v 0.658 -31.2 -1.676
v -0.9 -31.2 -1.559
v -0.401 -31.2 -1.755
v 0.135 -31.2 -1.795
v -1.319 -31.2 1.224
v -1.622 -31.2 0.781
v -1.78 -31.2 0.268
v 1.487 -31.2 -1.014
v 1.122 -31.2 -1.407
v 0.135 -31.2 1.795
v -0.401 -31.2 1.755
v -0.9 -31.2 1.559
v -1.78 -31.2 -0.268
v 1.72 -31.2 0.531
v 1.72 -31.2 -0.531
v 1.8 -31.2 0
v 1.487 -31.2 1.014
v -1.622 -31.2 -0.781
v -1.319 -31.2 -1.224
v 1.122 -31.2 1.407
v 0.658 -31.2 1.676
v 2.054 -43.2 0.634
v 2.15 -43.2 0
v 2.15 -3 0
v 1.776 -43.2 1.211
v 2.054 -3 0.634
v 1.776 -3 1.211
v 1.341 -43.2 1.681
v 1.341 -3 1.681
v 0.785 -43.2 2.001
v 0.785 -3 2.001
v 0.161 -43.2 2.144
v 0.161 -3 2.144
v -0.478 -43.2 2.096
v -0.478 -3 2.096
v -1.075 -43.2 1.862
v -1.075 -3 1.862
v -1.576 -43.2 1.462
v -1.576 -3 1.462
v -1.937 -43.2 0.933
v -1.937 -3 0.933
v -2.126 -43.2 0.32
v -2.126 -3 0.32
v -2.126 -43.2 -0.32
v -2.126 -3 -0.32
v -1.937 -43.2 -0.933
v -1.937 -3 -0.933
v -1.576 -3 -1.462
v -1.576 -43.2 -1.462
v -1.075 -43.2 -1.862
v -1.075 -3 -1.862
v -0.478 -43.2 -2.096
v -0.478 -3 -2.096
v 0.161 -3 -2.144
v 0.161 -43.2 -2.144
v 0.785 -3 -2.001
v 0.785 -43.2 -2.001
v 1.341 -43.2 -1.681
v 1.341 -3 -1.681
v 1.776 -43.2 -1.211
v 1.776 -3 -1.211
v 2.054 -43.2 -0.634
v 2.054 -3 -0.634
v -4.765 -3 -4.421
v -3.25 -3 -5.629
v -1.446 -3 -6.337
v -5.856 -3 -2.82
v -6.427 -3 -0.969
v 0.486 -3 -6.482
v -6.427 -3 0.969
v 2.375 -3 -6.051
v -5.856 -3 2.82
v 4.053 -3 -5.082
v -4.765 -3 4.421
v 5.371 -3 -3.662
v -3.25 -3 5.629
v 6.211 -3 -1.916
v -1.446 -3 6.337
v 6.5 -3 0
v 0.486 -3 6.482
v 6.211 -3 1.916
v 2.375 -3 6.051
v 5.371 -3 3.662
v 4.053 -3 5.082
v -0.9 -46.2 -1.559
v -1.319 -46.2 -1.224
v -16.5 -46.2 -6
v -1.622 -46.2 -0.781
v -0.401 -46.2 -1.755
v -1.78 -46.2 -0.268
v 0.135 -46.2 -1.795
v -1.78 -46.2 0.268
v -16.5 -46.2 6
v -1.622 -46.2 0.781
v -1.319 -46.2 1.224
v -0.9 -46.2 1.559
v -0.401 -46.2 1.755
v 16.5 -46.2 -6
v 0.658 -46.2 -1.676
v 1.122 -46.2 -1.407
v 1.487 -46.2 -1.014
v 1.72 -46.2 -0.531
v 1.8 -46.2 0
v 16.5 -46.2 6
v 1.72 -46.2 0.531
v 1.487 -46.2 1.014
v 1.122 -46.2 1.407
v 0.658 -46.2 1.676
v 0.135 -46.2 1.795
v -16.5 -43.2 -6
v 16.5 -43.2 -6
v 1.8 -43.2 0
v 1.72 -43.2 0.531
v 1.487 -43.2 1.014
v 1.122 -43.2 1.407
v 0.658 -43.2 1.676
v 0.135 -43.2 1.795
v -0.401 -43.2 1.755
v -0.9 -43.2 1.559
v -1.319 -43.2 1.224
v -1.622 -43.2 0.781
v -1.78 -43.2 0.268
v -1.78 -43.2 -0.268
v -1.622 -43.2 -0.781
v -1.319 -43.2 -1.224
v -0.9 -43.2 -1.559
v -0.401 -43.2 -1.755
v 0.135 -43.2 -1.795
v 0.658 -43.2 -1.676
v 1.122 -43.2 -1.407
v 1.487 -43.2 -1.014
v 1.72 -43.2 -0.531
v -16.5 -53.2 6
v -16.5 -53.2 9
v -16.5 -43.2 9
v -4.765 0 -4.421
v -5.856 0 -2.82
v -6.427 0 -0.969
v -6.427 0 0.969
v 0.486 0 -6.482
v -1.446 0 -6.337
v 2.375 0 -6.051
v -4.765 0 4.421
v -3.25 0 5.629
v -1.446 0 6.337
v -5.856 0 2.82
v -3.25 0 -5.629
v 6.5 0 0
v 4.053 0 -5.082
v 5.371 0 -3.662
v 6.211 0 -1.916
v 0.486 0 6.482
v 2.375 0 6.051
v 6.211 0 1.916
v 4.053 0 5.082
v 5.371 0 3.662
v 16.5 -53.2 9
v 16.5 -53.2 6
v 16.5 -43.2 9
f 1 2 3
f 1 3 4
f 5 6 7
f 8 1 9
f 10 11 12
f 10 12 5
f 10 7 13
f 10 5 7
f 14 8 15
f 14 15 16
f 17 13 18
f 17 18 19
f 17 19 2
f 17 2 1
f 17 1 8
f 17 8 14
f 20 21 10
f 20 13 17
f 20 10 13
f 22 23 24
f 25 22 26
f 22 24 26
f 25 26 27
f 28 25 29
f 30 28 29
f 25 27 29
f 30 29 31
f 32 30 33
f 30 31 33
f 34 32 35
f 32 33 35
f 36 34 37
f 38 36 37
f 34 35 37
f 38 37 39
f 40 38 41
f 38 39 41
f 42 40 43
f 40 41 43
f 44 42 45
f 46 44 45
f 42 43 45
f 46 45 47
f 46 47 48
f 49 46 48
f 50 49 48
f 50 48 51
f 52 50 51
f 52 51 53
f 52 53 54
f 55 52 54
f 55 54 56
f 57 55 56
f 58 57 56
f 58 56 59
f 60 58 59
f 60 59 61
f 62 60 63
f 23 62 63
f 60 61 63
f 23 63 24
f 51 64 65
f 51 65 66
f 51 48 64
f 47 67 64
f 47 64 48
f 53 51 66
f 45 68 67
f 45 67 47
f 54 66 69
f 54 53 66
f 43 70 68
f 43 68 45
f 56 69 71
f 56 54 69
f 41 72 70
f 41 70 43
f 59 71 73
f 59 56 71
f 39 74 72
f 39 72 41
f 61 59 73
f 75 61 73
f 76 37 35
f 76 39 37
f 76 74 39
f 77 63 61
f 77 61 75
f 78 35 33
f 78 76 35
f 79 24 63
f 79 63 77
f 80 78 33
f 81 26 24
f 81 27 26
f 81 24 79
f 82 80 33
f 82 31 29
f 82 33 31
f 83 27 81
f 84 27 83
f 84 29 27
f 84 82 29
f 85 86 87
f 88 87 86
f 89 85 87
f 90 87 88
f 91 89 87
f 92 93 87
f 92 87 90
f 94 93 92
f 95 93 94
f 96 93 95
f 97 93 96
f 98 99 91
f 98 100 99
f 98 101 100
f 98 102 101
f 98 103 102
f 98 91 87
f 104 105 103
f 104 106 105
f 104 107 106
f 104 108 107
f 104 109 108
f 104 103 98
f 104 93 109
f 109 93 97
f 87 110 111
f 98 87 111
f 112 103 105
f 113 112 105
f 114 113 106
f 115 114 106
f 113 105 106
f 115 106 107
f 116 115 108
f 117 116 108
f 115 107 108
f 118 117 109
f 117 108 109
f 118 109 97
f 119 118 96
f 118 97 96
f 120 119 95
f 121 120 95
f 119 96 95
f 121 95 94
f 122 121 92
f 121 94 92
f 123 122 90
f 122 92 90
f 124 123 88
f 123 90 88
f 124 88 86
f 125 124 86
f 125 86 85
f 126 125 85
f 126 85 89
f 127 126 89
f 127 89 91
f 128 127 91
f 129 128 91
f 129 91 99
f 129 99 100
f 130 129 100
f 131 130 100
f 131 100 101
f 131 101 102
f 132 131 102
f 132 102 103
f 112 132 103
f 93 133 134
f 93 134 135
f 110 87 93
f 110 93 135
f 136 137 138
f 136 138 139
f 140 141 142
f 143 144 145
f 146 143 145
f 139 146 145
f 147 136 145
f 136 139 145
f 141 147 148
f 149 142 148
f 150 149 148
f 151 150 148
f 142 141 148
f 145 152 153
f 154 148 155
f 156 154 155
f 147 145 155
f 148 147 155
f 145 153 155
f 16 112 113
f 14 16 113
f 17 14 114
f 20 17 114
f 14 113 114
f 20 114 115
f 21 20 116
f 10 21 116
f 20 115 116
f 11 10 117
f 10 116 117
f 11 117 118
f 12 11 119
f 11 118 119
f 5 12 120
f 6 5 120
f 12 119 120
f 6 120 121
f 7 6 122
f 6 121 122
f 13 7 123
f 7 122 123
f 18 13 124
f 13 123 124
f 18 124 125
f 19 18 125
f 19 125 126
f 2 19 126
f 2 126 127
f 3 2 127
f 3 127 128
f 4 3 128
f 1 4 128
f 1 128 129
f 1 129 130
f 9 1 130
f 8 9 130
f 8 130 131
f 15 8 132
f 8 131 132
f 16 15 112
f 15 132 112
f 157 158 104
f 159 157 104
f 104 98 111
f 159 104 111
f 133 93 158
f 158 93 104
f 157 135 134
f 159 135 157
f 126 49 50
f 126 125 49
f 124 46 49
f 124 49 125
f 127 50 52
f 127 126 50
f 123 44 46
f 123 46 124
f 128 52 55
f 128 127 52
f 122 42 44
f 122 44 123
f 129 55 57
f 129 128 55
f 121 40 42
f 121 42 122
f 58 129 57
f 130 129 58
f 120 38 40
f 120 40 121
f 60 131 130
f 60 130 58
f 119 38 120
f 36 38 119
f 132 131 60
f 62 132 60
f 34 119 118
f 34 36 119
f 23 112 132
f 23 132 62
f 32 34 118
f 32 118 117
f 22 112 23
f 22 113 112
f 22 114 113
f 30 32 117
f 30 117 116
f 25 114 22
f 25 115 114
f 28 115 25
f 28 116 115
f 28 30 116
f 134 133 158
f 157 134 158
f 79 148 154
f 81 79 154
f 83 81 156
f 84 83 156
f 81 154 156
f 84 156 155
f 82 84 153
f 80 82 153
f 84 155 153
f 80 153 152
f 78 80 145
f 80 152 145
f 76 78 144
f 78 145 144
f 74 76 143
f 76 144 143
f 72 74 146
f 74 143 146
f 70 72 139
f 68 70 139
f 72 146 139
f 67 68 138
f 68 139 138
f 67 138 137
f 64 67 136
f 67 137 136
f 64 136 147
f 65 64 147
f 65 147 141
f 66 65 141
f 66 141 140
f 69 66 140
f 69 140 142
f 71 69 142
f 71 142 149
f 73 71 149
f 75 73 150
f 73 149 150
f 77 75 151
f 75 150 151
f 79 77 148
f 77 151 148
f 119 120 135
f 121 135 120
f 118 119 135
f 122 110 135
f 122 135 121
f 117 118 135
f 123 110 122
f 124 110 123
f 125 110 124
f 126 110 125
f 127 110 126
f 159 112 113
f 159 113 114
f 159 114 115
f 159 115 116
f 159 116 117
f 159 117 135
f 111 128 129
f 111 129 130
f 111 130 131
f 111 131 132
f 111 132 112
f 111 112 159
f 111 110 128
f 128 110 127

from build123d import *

# Parameters (mm, degrees)
F0_R      = 6.5
F1_DEPTH  = 3
F2_R      = 2.15
F3_DEPTH  = 40.2
F4_R      = 1.8
F5_DEPTH  = 12
F6_W      = 33
F6_H      = 12
F7_DEPTH  = 3
F8_W      = 33
F8_H      = 10
F9_DEPTH  = 3
F10_R     = 1.8
F11_DEPTH = 46.201


with BuildPart() as f1:
    # F0 (on Front) → F1 (new body)
    with BuildSketch(Plane.XZ):
        Circle(F0_R)
    extrude(amount=F1_DEPTH)

    # F2 (on face) → F3 (join)
    with BuildSketch(Plane.XZ.offset(3)):
        Circle(F2_R)
    extrude(amount=F3_DEPTH)

    # F4 (on face) → F5 (cut)
    with BuildSketch(Plane.XZ.offset(43.2)):
        Circle(F4_R)
    extrude(amount=-F5_DEPTH, mode=Mode.SUBTRACT)


with BuildPart() as f7:
    # F6 (on face) → F7 (new body)
    with BuildSketch(Plane.XZ.offset(43.2)):
        Rectangle(F6_W, F6_H)
    extrude(amount=F7_DEPTH)

    # F8 (on face) → F9 (join)
    with BuildSketch(Plane.XY.offset(6)):
        with Locations((0, -48.2)):
            Rectangle(F8_W, F8_H)
    extrude(amount=F9_DEPTH)

    # F10 (on face) → F11 (cut, through all)
    with BuildSketch(Plane.XZ.offset(46.2)):
        Circle(F10_R)
    extrude(amount=-F11_DEPTH, mode=Mode.SUBTRACT)


solid = Compound([f1.part, f7.part])
